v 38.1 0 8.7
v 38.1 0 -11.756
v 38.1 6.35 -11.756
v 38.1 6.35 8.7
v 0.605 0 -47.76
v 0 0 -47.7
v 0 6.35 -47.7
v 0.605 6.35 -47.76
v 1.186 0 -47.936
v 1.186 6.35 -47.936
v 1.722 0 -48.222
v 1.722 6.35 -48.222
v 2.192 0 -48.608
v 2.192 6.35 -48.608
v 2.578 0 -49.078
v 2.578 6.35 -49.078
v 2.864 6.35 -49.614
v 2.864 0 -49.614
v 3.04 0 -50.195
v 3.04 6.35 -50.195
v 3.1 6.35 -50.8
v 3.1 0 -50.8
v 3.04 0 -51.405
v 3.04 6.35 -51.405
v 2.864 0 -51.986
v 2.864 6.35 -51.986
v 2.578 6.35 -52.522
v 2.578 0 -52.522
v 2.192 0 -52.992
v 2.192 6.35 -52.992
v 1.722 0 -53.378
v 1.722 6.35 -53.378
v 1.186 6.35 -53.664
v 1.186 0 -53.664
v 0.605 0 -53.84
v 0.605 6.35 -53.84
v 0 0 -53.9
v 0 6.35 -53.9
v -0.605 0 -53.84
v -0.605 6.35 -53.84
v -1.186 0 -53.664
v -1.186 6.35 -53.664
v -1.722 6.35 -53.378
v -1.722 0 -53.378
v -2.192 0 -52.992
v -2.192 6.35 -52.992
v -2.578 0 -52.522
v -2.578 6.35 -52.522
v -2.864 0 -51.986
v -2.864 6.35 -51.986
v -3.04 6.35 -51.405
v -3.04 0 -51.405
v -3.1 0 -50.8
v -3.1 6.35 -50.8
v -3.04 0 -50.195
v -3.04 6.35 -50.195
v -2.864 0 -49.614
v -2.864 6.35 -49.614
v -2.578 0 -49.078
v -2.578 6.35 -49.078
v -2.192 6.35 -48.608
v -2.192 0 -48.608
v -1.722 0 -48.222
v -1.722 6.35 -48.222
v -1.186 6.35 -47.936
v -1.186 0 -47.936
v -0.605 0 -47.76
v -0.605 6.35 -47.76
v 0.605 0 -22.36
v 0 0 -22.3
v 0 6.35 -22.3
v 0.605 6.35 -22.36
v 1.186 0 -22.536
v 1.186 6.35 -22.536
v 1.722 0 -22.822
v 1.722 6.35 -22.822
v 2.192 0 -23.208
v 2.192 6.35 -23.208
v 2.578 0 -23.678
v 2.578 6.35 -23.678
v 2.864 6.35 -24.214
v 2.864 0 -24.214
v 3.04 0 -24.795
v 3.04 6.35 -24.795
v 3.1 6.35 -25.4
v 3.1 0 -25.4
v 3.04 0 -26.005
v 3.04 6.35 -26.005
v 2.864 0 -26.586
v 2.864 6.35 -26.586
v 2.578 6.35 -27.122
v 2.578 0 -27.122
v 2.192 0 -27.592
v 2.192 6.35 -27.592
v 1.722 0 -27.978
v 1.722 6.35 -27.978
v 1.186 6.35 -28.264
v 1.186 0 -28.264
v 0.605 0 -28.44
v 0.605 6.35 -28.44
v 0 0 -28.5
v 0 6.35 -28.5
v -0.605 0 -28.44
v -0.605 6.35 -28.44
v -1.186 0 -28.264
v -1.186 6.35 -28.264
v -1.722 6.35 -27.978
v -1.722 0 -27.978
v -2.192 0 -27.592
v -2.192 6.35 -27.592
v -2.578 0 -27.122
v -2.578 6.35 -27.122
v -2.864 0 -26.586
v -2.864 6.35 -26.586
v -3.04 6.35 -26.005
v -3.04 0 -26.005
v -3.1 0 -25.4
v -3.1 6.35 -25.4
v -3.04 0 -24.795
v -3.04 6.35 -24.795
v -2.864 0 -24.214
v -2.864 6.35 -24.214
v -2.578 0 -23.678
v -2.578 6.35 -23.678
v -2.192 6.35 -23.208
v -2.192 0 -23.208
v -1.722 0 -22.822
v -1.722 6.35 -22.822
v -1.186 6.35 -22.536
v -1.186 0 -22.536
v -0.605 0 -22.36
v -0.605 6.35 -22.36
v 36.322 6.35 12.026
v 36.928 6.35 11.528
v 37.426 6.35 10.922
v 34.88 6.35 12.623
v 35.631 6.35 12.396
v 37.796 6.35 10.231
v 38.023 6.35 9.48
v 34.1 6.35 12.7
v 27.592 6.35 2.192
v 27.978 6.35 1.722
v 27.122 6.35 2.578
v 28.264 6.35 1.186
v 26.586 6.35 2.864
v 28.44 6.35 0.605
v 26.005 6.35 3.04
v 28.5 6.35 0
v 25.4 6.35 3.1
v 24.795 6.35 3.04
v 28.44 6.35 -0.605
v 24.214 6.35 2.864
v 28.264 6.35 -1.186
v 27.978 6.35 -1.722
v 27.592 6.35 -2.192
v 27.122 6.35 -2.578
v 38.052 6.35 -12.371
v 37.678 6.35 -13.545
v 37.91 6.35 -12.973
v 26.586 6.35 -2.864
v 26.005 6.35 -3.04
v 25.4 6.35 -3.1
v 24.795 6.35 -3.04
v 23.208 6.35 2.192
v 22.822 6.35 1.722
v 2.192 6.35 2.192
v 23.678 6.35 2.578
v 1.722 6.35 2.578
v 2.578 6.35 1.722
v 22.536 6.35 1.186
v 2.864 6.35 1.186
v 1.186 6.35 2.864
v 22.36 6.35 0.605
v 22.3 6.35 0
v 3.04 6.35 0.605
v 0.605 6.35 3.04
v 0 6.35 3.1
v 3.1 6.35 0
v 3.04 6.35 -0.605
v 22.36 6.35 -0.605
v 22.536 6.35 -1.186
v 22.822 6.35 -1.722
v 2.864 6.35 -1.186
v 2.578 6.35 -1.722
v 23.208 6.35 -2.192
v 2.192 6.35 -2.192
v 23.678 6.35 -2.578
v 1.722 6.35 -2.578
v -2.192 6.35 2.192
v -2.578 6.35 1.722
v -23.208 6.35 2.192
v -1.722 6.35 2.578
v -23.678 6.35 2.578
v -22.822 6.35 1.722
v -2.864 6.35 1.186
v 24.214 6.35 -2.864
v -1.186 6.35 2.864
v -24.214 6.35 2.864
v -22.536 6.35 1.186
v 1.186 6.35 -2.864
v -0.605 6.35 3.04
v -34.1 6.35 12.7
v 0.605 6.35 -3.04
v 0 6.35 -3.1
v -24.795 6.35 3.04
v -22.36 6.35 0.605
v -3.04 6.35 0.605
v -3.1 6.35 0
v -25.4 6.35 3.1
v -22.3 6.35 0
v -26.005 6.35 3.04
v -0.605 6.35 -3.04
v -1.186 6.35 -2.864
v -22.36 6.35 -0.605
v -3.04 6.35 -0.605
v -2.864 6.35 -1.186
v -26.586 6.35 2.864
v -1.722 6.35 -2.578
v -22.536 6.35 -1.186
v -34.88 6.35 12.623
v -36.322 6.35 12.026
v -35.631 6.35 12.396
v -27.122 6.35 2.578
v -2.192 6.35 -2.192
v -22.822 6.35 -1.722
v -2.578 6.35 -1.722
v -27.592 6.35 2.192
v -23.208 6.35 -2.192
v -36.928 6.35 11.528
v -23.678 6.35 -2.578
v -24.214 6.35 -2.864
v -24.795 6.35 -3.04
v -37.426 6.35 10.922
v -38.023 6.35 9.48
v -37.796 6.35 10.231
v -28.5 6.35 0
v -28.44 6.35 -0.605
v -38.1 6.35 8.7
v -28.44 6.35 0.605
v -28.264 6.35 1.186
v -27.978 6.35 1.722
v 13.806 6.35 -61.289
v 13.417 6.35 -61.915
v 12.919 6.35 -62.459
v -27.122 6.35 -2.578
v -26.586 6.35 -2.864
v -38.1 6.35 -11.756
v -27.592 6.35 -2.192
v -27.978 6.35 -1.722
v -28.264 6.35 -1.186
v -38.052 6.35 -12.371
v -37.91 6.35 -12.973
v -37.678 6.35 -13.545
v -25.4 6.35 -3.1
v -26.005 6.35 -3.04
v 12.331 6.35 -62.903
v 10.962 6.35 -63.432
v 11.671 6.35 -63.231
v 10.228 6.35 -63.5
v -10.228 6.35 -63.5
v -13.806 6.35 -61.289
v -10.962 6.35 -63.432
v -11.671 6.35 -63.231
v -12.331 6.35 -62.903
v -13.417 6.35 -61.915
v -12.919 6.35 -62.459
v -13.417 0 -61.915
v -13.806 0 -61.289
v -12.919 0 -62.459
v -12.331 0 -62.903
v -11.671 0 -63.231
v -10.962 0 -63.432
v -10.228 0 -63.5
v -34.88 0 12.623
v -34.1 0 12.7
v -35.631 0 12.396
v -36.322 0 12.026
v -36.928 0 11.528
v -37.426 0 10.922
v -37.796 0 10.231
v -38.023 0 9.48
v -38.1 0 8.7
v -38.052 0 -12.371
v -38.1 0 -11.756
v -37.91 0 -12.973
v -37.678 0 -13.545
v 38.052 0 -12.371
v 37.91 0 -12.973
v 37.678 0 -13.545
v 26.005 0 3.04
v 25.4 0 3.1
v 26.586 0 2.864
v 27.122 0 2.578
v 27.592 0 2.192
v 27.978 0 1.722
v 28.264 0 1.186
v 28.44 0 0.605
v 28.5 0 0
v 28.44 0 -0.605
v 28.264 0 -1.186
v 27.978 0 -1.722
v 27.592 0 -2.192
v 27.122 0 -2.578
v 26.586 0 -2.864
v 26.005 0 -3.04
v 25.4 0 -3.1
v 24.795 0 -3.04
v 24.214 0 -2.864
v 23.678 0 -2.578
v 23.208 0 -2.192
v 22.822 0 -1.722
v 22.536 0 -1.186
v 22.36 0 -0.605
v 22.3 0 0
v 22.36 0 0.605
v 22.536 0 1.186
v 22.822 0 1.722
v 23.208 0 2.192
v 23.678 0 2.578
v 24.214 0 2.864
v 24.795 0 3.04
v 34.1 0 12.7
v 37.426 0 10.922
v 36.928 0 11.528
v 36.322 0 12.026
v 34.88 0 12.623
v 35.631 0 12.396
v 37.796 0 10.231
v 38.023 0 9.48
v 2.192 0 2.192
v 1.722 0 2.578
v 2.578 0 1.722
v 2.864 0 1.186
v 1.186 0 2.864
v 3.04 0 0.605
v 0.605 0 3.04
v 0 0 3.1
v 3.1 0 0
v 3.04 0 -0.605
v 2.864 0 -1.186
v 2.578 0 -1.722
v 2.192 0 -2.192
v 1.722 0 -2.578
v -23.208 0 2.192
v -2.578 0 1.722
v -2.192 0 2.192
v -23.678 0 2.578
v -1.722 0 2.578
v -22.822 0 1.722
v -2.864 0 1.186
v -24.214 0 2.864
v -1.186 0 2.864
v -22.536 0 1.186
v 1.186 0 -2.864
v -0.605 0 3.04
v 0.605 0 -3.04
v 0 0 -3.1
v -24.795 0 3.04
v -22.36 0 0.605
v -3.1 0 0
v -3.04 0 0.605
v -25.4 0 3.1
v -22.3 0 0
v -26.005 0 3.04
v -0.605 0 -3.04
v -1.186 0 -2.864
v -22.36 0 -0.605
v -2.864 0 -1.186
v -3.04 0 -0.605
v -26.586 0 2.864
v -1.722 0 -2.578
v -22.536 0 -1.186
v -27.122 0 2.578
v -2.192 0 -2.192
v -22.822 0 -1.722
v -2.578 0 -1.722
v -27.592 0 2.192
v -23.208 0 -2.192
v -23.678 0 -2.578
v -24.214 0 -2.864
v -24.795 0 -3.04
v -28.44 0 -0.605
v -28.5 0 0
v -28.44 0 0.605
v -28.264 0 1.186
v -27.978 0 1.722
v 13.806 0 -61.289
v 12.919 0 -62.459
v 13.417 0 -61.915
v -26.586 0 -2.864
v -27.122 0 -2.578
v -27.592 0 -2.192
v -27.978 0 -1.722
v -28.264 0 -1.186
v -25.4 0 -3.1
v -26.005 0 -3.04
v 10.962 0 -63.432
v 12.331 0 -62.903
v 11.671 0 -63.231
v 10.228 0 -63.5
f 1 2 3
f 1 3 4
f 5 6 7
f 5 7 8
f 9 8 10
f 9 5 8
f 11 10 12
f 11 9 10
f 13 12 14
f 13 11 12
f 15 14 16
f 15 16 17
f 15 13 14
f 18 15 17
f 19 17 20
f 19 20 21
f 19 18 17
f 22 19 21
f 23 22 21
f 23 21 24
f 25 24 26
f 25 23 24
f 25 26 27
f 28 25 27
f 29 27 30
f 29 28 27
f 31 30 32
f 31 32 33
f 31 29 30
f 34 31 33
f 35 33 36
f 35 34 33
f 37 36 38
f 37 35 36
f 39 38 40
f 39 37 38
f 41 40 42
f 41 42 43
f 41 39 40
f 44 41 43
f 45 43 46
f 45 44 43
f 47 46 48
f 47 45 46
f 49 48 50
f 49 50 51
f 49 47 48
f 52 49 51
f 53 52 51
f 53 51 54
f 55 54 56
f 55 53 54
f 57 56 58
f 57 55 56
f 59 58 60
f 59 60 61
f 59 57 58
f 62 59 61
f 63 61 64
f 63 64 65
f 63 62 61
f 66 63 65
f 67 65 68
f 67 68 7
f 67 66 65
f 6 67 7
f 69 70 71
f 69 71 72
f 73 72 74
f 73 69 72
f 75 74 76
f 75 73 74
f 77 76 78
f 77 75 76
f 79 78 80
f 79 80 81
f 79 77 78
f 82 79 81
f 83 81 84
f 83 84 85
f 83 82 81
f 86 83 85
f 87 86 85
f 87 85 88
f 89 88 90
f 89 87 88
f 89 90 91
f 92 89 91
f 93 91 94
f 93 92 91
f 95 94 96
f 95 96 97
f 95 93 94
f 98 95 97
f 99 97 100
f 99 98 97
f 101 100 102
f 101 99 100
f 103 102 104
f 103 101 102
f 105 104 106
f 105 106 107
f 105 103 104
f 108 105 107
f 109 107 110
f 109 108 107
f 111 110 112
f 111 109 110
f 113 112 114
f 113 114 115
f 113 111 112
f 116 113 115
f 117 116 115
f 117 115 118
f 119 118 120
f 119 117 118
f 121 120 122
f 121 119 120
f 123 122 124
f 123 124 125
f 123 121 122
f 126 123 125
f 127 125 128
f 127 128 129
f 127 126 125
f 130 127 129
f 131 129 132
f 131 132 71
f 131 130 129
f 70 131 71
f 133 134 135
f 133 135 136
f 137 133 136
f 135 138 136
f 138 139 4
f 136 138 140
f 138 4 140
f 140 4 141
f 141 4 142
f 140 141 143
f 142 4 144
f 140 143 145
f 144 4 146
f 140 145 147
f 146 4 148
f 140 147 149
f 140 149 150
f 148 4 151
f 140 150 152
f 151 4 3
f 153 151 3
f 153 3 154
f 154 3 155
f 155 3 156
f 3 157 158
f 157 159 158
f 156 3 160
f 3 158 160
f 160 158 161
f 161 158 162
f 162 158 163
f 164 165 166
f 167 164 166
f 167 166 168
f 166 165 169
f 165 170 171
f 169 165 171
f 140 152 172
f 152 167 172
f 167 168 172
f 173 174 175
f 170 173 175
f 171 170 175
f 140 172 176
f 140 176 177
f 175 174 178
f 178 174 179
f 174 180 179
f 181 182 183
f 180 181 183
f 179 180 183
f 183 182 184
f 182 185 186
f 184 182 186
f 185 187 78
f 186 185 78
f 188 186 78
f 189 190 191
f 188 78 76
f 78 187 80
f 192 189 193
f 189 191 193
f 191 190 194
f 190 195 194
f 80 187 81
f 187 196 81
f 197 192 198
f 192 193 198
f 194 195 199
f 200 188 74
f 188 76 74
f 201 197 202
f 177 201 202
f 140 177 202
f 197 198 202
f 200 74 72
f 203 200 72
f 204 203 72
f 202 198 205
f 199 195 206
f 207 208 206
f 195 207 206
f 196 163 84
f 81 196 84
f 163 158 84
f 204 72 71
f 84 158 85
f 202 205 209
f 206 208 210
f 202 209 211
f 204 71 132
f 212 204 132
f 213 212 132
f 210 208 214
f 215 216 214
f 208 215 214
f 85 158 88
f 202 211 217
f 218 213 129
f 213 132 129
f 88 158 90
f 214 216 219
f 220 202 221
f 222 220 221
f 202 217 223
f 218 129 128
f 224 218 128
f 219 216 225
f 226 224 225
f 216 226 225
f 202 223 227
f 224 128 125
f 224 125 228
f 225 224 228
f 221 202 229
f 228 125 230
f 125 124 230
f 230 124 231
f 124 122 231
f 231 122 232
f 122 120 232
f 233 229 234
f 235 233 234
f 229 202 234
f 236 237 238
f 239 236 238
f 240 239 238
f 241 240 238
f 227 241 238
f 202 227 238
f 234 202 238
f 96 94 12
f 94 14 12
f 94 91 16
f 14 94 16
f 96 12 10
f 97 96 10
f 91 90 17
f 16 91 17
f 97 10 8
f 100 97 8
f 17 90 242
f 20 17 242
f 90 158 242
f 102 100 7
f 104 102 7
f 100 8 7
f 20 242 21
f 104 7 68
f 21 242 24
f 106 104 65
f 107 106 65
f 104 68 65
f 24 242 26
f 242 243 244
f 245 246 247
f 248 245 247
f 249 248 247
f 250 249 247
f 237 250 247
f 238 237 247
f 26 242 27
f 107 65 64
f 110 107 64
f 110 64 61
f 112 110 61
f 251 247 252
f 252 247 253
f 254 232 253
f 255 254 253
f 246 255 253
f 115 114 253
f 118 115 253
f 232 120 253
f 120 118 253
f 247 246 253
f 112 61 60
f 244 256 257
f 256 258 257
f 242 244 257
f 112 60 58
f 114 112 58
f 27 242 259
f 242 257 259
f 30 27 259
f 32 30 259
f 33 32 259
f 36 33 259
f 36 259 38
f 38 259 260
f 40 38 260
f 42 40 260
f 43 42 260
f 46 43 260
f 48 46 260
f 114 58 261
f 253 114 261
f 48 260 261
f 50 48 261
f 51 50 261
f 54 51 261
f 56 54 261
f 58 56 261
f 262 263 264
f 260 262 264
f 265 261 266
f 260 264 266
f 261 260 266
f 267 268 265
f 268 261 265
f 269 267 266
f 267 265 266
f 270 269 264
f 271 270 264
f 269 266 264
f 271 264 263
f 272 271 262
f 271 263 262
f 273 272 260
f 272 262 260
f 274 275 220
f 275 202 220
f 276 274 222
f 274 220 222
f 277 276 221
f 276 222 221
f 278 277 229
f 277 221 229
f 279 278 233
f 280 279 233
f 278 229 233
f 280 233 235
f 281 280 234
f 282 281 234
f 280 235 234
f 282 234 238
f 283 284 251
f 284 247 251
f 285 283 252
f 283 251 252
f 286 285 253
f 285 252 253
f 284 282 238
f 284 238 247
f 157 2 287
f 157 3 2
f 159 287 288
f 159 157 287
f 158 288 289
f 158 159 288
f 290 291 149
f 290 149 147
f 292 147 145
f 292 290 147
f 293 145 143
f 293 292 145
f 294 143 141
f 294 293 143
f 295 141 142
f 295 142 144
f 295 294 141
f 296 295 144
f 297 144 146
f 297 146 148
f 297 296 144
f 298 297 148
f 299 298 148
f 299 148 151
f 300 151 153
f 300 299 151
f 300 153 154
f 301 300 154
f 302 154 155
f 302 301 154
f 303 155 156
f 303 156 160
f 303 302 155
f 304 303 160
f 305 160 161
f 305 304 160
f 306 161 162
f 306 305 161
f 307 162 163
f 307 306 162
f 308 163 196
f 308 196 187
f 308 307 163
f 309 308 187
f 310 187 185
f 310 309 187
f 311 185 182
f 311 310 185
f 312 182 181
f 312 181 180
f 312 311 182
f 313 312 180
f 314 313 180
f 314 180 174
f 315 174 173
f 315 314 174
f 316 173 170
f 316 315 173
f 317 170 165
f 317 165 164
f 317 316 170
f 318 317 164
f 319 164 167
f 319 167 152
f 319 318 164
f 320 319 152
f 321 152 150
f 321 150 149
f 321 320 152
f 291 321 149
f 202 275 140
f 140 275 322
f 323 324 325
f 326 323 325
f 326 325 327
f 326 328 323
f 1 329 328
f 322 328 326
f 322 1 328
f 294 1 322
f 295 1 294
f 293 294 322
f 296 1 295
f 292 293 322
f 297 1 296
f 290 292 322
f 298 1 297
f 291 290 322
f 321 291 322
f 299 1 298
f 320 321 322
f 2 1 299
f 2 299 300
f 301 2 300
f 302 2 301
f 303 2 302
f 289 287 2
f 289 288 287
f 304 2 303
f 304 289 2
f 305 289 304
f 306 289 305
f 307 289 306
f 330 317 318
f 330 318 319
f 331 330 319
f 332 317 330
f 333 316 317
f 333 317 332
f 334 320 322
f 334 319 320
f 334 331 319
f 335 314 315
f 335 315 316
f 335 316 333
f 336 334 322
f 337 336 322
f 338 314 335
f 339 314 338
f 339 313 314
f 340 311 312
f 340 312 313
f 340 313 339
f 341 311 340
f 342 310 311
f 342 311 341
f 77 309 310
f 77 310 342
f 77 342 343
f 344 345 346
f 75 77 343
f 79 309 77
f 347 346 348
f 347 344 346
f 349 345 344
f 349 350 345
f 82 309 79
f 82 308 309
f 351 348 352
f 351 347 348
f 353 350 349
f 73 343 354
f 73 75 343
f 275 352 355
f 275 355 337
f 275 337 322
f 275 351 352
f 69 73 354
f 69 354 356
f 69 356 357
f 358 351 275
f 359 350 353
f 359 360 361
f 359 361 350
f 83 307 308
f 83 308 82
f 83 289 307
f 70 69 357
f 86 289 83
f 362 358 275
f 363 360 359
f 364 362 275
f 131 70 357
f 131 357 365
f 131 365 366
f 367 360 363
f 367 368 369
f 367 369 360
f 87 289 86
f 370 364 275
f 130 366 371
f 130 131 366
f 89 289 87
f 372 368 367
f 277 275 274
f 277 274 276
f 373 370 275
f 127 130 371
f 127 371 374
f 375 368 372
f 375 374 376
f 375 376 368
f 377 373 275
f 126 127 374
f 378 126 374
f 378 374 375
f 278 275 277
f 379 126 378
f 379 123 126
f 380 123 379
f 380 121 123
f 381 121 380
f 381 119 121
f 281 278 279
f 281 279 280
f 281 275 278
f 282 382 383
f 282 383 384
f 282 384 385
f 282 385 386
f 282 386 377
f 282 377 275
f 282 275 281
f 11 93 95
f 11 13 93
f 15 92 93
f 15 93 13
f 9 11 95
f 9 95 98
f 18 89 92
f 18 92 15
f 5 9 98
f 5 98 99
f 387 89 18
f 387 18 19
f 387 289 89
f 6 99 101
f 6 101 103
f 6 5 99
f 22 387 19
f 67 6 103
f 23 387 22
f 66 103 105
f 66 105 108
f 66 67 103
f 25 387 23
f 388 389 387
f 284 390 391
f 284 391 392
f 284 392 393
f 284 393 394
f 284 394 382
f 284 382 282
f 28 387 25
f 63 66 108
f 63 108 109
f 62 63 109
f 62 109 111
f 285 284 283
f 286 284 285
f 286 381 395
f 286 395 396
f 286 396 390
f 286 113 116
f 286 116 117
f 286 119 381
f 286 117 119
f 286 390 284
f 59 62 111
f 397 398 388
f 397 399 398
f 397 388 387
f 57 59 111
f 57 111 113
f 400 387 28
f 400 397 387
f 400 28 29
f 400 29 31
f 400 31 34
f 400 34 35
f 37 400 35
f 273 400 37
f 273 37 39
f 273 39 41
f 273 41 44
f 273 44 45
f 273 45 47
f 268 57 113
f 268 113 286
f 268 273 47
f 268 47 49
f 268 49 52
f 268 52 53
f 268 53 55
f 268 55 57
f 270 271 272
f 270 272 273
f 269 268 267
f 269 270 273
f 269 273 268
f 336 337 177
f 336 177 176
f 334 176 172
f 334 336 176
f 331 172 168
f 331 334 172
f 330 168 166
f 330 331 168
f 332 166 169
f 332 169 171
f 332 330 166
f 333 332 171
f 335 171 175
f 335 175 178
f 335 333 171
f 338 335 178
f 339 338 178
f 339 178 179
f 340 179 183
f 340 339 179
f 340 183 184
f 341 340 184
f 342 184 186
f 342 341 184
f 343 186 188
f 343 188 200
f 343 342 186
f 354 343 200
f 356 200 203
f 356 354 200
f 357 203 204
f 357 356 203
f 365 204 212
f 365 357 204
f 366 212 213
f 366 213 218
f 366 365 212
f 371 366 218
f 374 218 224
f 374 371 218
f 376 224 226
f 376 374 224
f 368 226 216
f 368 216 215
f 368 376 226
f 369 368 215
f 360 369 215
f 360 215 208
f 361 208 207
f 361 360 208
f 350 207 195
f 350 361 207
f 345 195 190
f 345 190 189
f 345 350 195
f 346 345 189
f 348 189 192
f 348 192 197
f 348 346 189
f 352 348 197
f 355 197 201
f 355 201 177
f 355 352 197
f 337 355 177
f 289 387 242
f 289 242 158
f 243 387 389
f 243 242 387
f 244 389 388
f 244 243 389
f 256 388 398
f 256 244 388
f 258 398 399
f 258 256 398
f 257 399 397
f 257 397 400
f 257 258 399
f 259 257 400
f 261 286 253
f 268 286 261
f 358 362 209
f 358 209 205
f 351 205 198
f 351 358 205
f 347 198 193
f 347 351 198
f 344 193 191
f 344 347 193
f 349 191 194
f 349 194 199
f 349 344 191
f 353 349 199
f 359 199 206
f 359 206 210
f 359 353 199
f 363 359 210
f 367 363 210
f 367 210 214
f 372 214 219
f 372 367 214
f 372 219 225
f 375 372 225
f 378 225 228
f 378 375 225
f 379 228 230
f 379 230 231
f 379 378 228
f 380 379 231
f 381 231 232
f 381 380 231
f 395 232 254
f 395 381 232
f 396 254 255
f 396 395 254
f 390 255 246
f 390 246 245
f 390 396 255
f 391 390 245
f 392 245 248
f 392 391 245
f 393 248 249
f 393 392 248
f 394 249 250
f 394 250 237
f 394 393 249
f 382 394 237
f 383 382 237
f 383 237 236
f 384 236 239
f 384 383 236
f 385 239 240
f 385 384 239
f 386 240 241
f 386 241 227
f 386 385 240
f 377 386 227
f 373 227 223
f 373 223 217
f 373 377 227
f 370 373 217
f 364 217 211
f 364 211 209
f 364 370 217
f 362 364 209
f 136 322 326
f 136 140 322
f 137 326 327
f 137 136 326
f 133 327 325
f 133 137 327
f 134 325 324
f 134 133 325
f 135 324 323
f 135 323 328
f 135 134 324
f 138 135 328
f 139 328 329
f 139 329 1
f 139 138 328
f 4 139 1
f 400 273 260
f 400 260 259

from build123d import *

# Parameters (mm, degrees)
SKETCH1_R           = 3.1
BOSS_EXTRUDE1_DEPTH = 6.35
FILLET1_R           = 4


with BuildPart() as part:
    # Sketch1 → Boss-Extrude1 (new body)
    with BuildSketch(Plane(origin=(0, 0, 0), x_dir=(1, 0, 0), z_dir=(0, 1, 0))):
        Polygon((0, -12.7), (-38.1, -12.7), (-38.1, 12.7), (-12.7, 63.5), (12.7, 63.5), (38.1, 12.7), (38.1, -12.7), align=None)
        with Locations(Location((0, 50.8, 0), (0, 0, 270))):
            Circle(SKETCH1_R, mode=Mode.SUBTRACT)
        with Locations(Location((0, 25.4, 0), (0, 0, 270))):
            Circle(SKETCH1_R, mode=Mode.SUBTRACT)
        with Locations(Location((25.4, 0, 0), (0, 0, 270))):
            Circle(SKETCH1_R, mode=Mode.SUBTRACT)
        with Locations(Location((0, 0, 0), (0, 0, 270))):
            Circle(SKETCH1_R, mode=Mode.SUBTRACT)
        with Locations(Location((-25.4, 0, 0), (0, 0, 270))):
            Circle(SKETCH1_R, mode=Mode.SUBTRACT)
    extrude(amount=BOSS_EXTRUDE1_DEPTH)

    # Fillet1
    fillet1_edges = [part.edges().sort_by_distance(p)[0] for p in [
        (-38.1, 3.175, 12.7),
        (-38.1, 3.175, -12.7),
        (-12.7, 3.175, -63.5),
        (12.7, 3.175, -63.5),
        (38.1, 3.175, -12.7),
        (38.1, 3.175, 12.7),
    ]]
    fillet(fillet1_edges, radius=FILLET1_R)


solid = part.part
